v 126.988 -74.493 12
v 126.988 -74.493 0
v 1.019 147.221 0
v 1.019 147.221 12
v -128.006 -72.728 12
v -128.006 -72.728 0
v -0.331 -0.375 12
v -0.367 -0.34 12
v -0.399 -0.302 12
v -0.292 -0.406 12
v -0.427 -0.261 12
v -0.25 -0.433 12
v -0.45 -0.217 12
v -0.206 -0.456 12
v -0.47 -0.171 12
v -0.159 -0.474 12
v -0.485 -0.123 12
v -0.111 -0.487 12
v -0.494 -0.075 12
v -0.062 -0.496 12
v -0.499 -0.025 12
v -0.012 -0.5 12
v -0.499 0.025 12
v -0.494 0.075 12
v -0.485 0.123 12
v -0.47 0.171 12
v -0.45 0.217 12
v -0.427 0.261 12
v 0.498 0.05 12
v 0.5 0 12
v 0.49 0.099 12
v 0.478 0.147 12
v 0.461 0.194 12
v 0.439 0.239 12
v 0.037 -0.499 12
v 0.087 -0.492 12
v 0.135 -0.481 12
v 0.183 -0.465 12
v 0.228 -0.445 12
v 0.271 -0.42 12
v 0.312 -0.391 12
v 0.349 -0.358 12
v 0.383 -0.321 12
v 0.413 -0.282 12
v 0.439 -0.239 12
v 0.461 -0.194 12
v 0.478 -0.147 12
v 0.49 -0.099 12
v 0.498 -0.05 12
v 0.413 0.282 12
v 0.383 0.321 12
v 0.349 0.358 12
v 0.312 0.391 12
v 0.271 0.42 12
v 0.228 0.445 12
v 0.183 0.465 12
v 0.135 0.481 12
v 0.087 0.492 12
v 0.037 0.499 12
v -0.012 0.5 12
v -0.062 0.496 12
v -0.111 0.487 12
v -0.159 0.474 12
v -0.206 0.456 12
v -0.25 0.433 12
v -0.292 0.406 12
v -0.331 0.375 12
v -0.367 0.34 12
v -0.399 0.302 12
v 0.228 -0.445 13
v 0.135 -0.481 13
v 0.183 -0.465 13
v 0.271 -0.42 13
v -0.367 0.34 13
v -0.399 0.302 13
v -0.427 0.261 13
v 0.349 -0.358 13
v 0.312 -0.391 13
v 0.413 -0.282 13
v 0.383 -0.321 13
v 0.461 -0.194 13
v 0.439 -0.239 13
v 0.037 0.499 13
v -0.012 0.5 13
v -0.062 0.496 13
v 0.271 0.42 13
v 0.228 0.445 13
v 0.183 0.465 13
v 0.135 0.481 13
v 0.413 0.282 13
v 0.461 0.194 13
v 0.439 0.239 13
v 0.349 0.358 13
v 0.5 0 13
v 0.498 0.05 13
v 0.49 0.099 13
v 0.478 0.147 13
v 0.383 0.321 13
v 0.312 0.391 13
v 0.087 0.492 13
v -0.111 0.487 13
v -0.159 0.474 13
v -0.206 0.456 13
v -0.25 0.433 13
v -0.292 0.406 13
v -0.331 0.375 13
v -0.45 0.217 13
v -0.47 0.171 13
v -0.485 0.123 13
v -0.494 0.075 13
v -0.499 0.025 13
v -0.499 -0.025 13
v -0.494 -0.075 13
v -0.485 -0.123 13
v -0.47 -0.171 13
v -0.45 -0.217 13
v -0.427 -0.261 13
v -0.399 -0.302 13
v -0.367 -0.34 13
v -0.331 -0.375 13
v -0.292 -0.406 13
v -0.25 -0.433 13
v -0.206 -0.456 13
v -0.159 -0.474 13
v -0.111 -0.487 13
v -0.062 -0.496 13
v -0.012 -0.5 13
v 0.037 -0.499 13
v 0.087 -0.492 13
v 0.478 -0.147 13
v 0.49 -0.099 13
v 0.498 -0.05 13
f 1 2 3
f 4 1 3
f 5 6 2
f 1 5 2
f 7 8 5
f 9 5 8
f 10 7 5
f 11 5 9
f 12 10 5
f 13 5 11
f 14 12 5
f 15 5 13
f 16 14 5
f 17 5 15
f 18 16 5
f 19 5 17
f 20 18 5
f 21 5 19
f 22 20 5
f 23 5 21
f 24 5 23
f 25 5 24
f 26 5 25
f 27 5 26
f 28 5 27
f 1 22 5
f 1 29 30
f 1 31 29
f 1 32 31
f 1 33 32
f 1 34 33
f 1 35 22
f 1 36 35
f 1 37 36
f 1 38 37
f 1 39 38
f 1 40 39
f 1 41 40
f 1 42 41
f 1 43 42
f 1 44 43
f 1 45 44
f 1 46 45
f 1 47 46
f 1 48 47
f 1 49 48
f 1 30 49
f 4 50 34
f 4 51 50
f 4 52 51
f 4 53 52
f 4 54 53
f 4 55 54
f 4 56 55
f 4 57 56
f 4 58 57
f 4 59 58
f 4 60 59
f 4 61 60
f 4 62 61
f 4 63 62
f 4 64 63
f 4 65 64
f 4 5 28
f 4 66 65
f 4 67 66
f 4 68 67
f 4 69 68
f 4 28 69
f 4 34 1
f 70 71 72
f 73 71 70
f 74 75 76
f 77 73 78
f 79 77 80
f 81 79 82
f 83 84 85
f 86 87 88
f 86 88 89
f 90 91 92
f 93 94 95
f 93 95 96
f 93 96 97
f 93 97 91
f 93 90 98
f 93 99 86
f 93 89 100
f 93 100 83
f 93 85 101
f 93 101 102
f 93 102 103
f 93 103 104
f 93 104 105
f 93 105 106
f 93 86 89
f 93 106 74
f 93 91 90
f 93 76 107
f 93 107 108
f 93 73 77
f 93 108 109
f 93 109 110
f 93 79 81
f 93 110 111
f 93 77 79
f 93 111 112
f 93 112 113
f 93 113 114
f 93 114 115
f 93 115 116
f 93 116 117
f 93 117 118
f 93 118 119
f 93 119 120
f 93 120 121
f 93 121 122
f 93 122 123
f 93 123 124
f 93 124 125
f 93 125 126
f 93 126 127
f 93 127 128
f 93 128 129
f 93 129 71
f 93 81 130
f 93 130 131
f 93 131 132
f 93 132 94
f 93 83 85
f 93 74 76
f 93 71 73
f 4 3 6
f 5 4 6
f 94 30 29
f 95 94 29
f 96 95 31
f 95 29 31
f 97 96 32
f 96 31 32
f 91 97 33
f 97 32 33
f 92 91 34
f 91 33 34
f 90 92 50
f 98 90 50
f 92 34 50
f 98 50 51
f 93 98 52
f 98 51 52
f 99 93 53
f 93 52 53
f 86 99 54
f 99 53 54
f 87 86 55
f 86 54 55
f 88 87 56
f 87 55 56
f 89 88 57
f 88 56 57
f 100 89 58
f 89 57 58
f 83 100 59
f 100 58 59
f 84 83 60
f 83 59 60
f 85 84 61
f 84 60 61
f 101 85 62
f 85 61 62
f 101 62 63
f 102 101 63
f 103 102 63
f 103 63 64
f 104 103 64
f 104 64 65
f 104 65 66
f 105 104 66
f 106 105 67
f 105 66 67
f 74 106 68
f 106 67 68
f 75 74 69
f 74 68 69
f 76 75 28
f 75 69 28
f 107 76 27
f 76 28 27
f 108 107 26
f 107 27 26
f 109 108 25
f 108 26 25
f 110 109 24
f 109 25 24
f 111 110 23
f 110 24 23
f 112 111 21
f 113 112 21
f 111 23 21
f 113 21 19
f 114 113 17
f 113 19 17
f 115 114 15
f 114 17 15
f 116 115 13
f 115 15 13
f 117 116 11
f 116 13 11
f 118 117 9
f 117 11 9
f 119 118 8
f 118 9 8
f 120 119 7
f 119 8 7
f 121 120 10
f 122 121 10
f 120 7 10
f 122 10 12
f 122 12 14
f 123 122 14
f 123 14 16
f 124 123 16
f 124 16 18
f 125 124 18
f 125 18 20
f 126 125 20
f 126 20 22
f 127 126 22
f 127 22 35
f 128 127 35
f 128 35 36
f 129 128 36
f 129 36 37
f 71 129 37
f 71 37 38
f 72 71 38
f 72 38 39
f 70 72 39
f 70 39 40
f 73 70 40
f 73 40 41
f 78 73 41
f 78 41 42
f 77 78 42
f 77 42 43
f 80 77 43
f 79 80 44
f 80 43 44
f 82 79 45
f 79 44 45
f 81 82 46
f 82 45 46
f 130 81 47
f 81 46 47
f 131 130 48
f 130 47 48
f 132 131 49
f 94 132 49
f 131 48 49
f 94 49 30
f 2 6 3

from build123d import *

# Parameters (mm, degrees)
F1_DEPTH = 12
F2_R     = 0.5
F3_DEPTH = 1


with BuildPart() as f1:
    # F0 (on Top) → F1 (new body)
    with BuildSketch(Plane.XY):
        Polygon((126.98753, -74.492732), (1.018833, 147.220793), (-128.006364, -72.728061), align=None)
    extrude(amount=F1_DEPTH)

    # F2 (on face) → F3 (join)
    with BuildSketch(Plane.XY.offset(12)):
        Circle(F2_R)
    extrude(amount=F3_DEPTH)


solid = f1.part
